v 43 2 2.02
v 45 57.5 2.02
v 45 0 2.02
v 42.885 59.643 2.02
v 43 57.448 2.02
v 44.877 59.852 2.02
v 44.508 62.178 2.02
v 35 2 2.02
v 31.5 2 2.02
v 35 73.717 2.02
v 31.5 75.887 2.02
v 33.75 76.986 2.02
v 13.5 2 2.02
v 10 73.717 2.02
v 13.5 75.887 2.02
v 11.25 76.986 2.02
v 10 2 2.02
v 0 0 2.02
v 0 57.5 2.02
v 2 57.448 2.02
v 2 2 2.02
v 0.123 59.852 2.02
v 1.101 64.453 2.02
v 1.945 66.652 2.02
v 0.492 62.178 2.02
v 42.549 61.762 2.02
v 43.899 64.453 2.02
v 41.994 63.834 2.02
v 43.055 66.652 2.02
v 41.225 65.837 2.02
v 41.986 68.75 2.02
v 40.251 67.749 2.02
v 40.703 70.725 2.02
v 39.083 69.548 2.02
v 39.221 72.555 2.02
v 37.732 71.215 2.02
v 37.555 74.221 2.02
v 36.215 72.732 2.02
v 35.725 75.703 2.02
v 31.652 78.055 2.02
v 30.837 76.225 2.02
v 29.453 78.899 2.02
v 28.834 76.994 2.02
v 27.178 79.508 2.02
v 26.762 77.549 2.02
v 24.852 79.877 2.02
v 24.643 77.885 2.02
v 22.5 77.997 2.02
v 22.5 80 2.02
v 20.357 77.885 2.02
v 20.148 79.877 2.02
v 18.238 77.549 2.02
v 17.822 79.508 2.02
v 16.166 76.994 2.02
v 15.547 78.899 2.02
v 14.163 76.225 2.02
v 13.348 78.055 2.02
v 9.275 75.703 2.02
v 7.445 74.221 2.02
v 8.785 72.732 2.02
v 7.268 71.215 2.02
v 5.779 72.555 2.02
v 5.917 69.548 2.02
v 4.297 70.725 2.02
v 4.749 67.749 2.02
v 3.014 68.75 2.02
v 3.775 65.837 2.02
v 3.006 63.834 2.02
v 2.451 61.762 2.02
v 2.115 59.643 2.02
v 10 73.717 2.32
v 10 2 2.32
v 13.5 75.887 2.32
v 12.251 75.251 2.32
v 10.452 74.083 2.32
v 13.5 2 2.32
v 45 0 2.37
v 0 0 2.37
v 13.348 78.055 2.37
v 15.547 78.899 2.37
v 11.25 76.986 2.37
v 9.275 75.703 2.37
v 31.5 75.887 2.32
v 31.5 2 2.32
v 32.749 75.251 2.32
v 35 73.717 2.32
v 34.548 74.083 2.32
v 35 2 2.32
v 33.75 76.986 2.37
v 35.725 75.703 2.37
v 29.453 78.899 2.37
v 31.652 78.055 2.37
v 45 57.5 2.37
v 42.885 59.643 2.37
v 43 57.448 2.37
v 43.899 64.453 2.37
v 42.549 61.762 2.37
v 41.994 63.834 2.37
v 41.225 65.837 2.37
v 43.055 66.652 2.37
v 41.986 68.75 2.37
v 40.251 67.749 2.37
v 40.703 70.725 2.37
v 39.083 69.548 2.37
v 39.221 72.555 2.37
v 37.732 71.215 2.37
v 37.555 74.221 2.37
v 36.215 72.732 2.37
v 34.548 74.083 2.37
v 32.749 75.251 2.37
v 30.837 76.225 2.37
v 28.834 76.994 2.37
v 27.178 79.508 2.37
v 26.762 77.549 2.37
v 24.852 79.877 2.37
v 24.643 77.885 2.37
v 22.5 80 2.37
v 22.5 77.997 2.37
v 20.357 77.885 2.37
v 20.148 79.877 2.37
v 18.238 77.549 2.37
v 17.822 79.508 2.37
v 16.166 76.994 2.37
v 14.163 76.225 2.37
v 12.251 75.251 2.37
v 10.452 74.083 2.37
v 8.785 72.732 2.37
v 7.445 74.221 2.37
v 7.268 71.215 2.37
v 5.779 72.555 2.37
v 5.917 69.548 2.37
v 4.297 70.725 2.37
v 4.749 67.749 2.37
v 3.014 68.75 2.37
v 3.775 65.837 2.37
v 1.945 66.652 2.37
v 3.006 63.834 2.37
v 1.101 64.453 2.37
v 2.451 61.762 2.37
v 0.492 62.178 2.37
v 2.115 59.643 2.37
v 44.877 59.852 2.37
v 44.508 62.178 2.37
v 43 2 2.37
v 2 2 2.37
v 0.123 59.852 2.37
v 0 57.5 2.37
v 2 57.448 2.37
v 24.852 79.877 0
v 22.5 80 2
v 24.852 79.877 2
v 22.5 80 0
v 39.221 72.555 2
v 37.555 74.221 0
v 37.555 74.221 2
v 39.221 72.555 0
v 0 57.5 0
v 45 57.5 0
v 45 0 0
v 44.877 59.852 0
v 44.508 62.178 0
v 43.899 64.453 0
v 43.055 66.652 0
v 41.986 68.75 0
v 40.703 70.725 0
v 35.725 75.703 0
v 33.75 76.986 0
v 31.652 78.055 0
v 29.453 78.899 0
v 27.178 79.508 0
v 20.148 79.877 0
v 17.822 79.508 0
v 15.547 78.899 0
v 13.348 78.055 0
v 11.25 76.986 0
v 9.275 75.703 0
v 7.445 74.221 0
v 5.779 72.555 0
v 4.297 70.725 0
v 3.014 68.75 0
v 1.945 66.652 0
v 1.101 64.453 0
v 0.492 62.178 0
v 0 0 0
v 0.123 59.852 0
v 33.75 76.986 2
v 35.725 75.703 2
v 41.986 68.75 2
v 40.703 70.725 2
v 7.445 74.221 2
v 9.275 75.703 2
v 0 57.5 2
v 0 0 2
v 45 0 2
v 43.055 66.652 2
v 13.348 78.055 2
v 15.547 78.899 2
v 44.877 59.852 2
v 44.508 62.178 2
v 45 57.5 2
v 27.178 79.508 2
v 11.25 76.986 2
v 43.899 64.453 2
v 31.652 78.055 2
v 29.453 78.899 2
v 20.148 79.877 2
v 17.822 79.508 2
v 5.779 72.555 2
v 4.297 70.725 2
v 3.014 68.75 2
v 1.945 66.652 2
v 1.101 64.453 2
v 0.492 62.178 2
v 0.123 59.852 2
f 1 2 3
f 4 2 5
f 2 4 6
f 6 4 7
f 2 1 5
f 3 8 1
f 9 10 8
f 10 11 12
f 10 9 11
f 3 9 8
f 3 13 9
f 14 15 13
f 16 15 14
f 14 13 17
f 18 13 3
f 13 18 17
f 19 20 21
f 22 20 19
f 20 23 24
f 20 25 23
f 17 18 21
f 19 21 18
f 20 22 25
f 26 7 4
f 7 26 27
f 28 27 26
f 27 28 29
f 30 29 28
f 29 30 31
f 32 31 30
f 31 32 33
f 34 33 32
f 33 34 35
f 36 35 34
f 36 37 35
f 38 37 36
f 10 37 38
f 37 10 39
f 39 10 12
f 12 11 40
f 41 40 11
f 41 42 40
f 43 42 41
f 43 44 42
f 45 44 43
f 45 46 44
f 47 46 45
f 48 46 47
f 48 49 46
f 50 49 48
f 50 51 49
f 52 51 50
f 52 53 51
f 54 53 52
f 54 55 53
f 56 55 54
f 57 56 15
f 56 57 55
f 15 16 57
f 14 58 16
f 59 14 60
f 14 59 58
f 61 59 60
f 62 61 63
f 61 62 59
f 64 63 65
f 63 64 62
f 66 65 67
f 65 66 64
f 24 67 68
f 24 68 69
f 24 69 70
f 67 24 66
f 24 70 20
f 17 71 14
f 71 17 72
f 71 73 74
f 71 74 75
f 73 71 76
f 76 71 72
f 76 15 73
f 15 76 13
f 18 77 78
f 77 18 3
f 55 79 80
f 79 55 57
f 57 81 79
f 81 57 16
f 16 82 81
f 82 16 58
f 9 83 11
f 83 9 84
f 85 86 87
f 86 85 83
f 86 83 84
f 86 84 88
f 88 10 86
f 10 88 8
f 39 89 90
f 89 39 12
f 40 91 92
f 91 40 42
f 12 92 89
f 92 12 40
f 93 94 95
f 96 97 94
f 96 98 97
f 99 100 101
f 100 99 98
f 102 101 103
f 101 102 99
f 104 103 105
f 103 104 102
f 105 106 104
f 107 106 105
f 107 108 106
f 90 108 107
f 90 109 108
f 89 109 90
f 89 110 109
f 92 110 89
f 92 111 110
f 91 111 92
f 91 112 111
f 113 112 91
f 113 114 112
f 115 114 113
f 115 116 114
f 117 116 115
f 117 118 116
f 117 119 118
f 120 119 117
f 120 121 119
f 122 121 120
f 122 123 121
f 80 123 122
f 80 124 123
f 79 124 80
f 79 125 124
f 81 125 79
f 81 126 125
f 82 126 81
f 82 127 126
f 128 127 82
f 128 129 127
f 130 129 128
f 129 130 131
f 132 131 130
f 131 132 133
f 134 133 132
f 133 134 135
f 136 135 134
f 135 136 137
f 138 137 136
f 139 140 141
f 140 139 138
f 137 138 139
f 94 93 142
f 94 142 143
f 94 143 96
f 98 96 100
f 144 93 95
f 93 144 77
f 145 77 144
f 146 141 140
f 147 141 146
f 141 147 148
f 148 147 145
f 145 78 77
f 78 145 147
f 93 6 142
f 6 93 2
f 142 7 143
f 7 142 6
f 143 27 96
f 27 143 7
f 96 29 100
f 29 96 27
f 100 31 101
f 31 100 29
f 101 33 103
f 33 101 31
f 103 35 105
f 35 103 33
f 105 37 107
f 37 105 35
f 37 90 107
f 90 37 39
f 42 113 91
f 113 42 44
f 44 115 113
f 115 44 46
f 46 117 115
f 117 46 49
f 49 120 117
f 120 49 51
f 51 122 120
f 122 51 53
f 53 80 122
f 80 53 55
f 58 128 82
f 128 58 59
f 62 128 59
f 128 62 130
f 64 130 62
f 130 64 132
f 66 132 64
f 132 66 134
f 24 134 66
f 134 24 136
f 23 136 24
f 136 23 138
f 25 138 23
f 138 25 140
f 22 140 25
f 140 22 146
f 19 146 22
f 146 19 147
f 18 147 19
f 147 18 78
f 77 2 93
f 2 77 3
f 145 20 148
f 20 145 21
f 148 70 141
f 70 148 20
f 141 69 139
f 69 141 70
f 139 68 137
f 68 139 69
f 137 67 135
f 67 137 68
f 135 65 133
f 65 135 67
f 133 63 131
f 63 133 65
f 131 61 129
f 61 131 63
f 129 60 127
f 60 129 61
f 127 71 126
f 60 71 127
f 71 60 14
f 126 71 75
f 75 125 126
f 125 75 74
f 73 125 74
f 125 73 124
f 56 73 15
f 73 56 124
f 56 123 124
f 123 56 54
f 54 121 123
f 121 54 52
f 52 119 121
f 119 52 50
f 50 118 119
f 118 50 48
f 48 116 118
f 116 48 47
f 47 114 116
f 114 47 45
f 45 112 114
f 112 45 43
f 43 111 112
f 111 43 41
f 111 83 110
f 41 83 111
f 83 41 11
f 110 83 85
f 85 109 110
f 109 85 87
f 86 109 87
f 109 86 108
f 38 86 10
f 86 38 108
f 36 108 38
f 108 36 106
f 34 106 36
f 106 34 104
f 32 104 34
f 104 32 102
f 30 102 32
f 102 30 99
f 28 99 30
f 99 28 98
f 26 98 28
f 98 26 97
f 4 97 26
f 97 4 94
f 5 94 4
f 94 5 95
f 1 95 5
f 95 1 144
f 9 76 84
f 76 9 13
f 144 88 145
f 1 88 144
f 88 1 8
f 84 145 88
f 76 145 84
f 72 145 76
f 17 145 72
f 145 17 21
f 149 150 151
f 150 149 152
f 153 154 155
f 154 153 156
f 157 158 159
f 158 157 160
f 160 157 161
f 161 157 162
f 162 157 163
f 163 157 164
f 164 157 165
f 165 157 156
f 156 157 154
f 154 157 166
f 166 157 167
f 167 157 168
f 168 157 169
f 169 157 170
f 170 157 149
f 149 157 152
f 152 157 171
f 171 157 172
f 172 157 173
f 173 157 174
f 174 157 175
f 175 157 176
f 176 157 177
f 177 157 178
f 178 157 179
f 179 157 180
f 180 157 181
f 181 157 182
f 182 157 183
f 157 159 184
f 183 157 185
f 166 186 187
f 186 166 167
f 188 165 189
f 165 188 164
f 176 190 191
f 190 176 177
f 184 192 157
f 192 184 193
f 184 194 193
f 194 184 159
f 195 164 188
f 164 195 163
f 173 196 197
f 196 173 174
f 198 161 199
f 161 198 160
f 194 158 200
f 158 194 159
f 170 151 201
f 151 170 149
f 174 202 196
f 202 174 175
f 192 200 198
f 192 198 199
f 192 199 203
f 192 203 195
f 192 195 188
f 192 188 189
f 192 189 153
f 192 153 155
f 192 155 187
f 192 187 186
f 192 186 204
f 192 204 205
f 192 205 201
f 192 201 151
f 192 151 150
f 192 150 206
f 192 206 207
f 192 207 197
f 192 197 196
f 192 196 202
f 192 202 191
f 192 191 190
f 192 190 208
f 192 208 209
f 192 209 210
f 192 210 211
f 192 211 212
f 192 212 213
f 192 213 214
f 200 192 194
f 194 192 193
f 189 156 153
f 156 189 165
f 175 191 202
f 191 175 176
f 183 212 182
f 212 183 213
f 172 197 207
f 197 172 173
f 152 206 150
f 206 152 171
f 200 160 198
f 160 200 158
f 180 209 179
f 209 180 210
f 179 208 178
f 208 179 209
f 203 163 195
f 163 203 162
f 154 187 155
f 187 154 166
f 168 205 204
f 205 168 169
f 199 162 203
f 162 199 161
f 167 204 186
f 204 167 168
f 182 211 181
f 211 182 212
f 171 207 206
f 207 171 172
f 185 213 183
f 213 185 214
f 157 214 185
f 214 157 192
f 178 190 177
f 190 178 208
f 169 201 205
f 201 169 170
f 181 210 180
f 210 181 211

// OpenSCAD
// OpenSCAD: съёмный погон майора 80×45 мм
// Версия: v1.4 — сборка или раскладка деталей для печати

description = "Removable Major shoulder board 80x45 mm, 3-part multicolor";
version_str = "1.4";

use <../modules.scad>;

// ===== Точность аппроксимации окружностей =====
$fn = 0;
$fa = 6;
$fs = 0.35;
pin_fs = 0.25;

// ===== Режим печати тест‑фрагментов =====
test_fragment = false;
frag_size = 20;
frag_index = 0;
frag_gap_x = 10;
frag_h_extra = 20;

// ===== Общие доп. параметры =====
tiny = 0.1;
edge_chamfer_z = 0;
edge_chamfer_x = 0;
edge_chamfer_y = 0;
screen_frame_gap = 0.2;

// ===== Параметры модели =====
board_length = 80;
board_width = 45;
board_th = 2.0;

top_round_r = board_width / 2;
rect_h = board_length - top_round_r;

border_w = 2.0;
border_relief = 0.35;

stripe_w = 3.5;
stripe_center_gap = 18.0;
stripe_relief = 0.3;

star_d = 20;
star_center_x = board_width / 2;
star_center_y = 45;
star_outer_r = star_d / 2;
star_inner_r = star_outer_r * 0.42;
star_relief = 1.6;

color_parts = true;
layout_parts = false; // false — сборка (для Bambu/3 STL); true — разнести по столу
part_gap_x = 10; // зазор между деталями при layout_parts=true, мм
part_stack_gap = 0.02; // микрозазор между слоями в сборке, мм (0 = вплотную)
print_blue_base = true;
print_red_trim = true;
print_rank_star = true;

// ===== Комментарии ===========================
/*
Модель: съёмный погон майора для рубашки/куртки.
Блоки:
- Переменные (вверху) для всех размеров
- Комментарии (этот блок)
- Модули фрагментов детали (ниже)
- show_all() — вывод включённых деталей

layout_parts=false: детали в сборочной позиции (экспорт STL для Bambu).
layout_parts=true: каждая деталь на Z=0, разнесена по X для печати по отдельности.

Детали (3 модуля для печати):
- blue_base — синее поле погона
- red_trim — красная окантовка и два просвета
- rank_star — золотая звезда с 5 рёбрами
Контур: прямоугольник board_width × rect_h с полукруглым верхом (радиус top_round_r).
Ось погона: X = board_width/2.
*/

// ===== Вспомогательные функции ====================
function part_slot_step() = board_width + part_gap_x;

function red_trim_h() = max(border_relief, stripe_relief);

function stack_red_z() = board_th + part_stack_gap;

function stack_star_z() = stack_red_z() + red_trim_h() + part_stack_gap;

function count_print_parts() =
  (print_blue_base ? 1 : 0) +
  (print_red_trim ? 1 : 0) +
  (print_rank_star ? 1 : 0);

function layout_index(enabled, after_blue, after_red) =
  layout_parts && count_print_parts() > 1 && enabled ?
    (after_blue + after_red) * part_slot_step() :
    0;

// ===== Модули деталей ====================
module board_outline_2d() {
  union() {
    square([board_width, board_rect_h()]);
    translate([board_width / 2, board_rect_h()])
      circle(r = top_round_r, $fs = pin_fs, $fa = 6);
  }
}

function star_xy_points(outer_r, inner_r, n = 5, rot = -90) = [
  for (i = [0 : 2 * n - 1])
    let(
      a = rot + i * 180 / n,
      r = (i % 2 == 0) ? outer_r : inner_r
    )
    [r * cos(a), r * sin(a)]
];

function star_ridge_top_faces(n = 5) = [
  for (k = [0 : n - 1])
    let(
      outer = 1 + 2 * k,
      inner_after = 1 + (2 * k + 1) % (2 * n),
      inner_before = 1 + (2 * k - 1 + 2 * n) % (2 * n)
    )
    each [[0, outer, inner_after], [0, inner_before, outer]]
];

function star_ridge_bottom_faces(n = 5) = [
  for (i = [0 : 2 * n - 1])
    [2 * n + 1, 1 + i, 1 + (i + 1) % (2 * n)]
];

function star_ridge_vertices(outer_r, inner_r, peak_h, n = 5, rot = -90) =
  let(pts = star_xy_points(outer_r, inner_r, n, rot))
  concat(
    [[0, 0, peak_h]],
    [for (p = pts) [p[0], p[1], 0]],
    [[0, 0, 0]]
  );

module rank_star_body() {
  polyhedron(
    points = star_ridge_vertices(star_outer_r, star_inner_r, star_relief),
    faces = concat(star_ridge_top_faces(), star_ridge_bottom_faces()),
    convexity = 10
  );
}

module base_pad() {
  linear_extrude(height = board_th)
    board_outline_2d();
}

module red_border() {
  linear_extrude(height = border_relief)
    difference() {
      board_outline_2d();
      inset(d = border_w)
        board_outline_2d();
    }
}

module red_stripe(offset_x) {
  intersection() {
    linear_extrude(height = stripe_relief)
      translate([offset_x - stripe_w / 2, -tiny])
        square([stripe_w, board_length + 2 * tiny]);
    linear_extrude(height = stripe_relief + tiny)
      board_outline_2d();
  }
}

module red_stripe_left() {
  red_stripe(star_center_x - (stripe_center_gap + stripe_w) / 2);
}

module red_stripe_right() {
  red_stripe(star_center_x + (stripe_center_gap + stripe_w) / 2);
}

function board_rect_h() = board_length - top_round_r;

// ===== Геометрия деталей (локально от Z=0) ====================
module blue_base_geom() {
  if (color_parts) color("MidnightBlue") base_pad();
  else base_pad();
}

module red_trim_geom() {
  intersection() {
    linear_extrude(height = max(border_relief, stripe_relief) + tiny)
      board_outline_2d();
    union() {
      red_border();
      red_stripe_left();
      red_stripe_right();
    }
  }
}

module rank_star_geom() {
  if (color_parts) color("Gold") rank_star_body();
  else rank_star_body();
}

// ===== Детали в сборочной позиции ====================
module blue_base() {
  blue_base_geom();
}

module red_trim() {
  translate([0, 0, stack_red_z()]) {
    if (color_parts) color("FireBrick") red_trim_geom();
    else red_trim_geom();
  }
}

module rank_star() {
  translate([star_center_x, star_center_y, stack_star_z()])
    rank_star_geom();
}

// ===== Размещение деталей ====================
module placed_blue_base() {
  translate([layout_index(true, 0, 0), 0, 0])
    blue_base();
}

module placed_red_trim() {
  translate([
    layout_index(print_red_trim, print_blue_base, 0),
    0,
    layout_parts ? 0 : stack_red_z()
  ]) {
    if (color_parts) color("FireBrick") red_trim_geom();
    else red_trim_geom();
  }
}

module placed_rank_star() {
  translate([
    layout_index(
      print_rank_star,
      print_blue_base,
      print_red_trim
    ),
    0,
    0
  ])
    translate([
      layout_parts ? 0 : star_center_x,
      layout_parts ? 0 : star_center_y,
      layout_parts ? 0 : stack_star_z()
    ])
      rank_star_geom();
}

module show_all() {
  clip_for_fragments_bbox(
    layout_parts ?
      part_slot_step() * max(0, count_print_parts() - 1) + board_width :
      board_width,
    board_length,
    stack_star_z() + star_relief + 1,
    test_fragment,
    frag_size,
    frag_index,
    frag_h_extra
  ) {
    if (print_blue_base) placed_blue_base();
    if (print_red_trim) placed_red_trim();
    if (print_rank_star) placed_rank_star();
  }
}

// ===== Точка входа ====================
show_all();
